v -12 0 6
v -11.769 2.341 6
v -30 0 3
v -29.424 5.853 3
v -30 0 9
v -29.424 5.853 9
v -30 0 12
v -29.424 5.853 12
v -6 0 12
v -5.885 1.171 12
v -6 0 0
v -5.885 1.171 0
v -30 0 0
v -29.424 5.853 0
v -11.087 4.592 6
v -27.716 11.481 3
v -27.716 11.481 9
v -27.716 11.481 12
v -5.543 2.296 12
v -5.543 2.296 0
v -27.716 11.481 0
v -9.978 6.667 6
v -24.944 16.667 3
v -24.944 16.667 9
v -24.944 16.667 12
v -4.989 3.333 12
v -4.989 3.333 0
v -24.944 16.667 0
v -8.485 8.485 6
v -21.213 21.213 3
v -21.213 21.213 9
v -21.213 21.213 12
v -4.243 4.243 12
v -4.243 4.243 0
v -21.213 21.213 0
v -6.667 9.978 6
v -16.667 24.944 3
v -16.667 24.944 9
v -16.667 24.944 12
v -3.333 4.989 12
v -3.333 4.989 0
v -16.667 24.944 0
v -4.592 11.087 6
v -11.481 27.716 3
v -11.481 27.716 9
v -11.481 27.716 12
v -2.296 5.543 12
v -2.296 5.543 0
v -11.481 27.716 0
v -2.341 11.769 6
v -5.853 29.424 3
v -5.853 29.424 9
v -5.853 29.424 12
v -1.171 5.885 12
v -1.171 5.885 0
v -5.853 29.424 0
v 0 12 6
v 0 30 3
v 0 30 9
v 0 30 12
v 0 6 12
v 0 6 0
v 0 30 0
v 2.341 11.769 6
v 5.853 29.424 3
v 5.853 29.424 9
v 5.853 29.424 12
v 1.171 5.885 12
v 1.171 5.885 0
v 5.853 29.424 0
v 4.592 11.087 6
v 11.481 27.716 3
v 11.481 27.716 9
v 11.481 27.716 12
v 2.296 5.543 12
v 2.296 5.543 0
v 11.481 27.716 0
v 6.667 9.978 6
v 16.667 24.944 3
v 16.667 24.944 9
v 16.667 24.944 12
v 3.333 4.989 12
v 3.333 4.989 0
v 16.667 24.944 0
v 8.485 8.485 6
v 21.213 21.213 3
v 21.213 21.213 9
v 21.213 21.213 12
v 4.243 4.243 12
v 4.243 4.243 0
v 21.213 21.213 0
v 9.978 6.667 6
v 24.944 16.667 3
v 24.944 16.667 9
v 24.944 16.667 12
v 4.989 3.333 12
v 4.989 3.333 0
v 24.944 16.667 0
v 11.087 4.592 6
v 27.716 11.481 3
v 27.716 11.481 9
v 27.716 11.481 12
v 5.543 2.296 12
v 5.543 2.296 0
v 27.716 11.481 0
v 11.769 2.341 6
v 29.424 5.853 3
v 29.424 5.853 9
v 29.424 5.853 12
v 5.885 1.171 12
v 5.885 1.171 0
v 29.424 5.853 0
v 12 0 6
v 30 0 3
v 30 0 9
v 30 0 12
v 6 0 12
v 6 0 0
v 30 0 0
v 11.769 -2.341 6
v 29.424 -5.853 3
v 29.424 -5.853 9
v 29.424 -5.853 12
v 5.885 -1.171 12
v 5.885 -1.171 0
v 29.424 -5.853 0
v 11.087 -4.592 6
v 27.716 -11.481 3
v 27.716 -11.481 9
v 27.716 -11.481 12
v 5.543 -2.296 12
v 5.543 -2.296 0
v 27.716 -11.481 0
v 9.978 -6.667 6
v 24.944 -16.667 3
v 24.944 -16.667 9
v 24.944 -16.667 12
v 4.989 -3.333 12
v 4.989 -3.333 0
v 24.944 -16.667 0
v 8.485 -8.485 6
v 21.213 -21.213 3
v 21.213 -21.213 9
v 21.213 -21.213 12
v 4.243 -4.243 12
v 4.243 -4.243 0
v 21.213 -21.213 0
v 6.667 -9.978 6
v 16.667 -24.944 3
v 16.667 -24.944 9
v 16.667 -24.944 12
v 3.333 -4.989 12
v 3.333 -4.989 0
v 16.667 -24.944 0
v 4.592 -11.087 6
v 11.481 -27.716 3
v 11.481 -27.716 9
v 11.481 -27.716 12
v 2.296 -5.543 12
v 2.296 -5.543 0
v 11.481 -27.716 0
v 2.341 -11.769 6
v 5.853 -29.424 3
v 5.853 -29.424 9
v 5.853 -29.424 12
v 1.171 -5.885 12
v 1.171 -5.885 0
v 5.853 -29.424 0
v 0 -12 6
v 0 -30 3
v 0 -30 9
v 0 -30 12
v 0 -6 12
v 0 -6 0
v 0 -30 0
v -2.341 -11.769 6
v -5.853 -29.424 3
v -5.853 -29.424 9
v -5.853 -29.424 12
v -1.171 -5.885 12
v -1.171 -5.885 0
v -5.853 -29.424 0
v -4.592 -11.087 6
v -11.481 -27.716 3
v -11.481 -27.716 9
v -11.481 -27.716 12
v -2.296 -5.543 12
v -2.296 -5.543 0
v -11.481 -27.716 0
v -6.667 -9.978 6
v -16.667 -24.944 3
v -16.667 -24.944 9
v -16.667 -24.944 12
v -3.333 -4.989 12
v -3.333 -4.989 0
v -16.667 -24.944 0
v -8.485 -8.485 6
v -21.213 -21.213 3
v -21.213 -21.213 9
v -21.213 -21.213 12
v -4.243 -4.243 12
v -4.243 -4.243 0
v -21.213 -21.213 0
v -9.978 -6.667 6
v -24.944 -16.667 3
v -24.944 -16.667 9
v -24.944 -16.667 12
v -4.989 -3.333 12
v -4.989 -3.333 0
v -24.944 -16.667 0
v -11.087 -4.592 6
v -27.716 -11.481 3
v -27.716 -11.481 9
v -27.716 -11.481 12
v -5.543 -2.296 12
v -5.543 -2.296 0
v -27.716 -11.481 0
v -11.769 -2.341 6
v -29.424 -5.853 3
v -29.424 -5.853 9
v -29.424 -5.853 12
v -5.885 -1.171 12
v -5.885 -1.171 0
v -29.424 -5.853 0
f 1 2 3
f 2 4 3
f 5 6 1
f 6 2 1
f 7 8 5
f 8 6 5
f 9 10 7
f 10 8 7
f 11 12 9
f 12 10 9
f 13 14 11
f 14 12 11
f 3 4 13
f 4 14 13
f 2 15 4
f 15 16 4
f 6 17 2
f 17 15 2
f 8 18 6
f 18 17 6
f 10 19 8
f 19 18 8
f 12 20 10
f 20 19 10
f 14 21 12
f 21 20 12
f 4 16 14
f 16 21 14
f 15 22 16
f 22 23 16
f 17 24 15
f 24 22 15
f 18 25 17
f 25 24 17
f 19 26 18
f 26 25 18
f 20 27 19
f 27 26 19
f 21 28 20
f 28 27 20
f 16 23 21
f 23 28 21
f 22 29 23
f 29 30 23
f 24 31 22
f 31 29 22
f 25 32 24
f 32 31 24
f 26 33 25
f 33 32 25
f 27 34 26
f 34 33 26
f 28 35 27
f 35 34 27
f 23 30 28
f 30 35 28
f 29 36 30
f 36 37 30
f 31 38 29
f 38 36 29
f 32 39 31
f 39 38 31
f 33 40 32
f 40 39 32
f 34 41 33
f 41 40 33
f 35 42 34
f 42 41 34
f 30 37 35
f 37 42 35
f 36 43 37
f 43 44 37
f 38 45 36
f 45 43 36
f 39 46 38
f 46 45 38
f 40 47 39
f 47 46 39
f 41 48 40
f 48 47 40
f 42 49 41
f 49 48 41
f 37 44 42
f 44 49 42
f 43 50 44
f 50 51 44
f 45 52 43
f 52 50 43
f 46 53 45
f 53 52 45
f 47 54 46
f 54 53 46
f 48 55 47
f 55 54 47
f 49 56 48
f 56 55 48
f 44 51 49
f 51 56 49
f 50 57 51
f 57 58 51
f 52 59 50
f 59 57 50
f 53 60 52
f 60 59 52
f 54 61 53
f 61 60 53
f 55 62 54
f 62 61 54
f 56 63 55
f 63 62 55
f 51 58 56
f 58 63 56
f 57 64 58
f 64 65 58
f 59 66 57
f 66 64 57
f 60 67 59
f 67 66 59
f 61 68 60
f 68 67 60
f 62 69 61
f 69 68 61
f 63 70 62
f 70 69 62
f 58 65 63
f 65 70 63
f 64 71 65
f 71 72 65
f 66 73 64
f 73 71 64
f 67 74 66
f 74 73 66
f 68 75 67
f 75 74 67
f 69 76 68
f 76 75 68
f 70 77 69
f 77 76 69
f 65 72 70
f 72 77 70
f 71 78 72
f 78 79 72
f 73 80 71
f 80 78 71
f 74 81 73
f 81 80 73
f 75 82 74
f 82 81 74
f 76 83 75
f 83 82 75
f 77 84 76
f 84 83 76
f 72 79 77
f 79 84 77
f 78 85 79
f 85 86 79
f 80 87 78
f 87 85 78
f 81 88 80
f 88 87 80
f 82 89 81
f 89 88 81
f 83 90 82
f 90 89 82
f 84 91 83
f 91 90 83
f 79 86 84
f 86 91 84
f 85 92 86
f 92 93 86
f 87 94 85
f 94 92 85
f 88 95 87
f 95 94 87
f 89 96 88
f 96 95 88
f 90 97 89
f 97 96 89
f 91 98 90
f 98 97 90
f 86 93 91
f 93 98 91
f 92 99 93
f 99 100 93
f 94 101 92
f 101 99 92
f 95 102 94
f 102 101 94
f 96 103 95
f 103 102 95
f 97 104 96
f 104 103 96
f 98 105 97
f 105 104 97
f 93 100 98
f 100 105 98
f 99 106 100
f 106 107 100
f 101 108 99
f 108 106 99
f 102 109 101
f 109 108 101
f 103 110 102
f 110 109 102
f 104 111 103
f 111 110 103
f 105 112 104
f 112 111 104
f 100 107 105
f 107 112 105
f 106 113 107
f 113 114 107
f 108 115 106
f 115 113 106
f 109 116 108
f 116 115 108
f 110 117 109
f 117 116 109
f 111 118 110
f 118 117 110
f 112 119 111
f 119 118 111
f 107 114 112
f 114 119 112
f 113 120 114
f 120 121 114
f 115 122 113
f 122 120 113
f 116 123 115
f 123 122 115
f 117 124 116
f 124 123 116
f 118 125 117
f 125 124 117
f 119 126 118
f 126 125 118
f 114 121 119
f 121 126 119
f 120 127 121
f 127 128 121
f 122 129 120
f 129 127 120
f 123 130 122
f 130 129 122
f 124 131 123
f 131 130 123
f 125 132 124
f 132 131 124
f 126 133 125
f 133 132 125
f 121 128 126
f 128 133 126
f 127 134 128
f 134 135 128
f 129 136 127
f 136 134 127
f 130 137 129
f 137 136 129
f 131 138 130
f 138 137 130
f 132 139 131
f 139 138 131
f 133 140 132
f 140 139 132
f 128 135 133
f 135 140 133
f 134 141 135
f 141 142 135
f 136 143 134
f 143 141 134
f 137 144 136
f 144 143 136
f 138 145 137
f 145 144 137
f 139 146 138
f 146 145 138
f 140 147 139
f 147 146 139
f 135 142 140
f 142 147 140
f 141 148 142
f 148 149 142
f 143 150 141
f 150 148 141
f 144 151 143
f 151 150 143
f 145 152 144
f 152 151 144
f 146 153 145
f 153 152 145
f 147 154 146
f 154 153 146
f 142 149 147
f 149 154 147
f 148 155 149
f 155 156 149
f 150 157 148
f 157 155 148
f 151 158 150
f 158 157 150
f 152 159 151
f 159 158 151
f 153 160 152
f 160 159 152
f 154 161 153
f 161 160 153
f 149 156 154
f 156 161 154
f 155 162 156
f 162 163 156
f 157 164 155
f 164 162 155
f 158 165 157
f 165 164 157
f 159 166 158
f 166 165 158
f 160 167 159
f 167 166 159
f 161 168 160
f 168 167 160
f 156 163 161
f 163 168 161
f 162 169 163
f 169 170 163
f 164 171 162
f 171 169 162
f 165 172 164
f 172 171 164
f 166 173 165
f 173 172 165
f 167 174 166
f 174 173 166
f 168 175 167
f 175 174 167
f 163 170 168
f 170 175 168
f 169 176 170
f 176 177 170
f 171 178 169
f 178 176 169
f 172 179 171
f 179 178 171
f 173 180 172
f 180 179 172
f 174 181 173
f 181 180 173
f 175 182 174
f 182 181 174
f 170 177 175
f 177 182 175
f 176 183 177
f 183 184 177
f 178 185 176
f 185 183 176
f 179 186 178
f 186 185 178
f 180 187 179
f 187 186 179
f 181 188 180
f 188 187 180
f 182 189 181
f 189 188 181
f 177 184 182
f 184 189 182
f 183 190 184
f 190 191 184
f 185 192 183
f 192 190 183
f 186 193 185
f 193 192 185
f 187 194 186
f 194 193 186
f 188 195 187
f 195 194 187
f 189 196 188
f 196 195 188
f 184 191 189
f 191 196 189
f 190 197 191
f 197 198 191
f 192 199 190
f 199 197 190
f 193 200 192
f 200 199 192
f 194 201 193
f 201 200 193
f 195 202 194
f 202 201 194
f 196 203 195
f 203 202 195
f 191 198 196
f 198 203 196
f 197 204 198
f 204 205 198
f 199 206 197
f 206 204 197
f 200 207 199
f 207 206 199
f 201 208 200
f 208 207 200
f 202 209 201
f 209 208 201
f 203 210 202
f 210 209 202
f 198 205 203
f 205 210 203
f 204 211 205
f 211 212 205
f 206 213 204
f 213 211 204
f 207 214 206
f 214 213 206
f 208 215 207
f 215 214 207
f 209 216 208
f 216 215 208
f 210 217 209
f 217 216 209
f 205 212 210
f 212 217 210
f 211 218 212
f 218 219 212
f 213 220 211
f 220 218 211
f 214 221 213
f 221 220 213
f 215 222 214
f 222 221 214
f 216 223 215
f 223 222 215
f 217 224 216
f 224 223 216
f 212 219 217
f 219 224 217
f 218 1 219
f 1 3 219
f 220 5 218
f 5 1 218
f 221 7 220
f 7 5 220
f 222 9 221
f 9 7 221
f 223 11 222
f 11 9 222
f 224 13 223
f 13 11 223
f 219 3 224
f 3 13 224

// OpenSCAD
$fn = 32;

// ----------------------------------------------------------------------
// Revolved part: V-groove pulley R30
// ----------------------------------------------------------------------

// --- parameters (mm) ---
bore_r = 6;               // bore radius
rim_r = 30;               // rim radius
rim_t = 12;               // rim width
groove_r = 12;            // groove root radius
groove_w = 3;             // groove half width
revolve_angle = 360;      // revolve sweep, degrees

bore_d = 2 * bore_r;
rim_d = 2 * rim_r;
groove_d = 2 * groove_r;

profile = [[6, 0], [30, 0], [30, 3], [12, 6], [30, 9], [30, 12], [6, 12]];  // primary outline, 7 points, counter clockwise

// --- the one profile operation ---
rotate_extrude(angle = revolve_angle) polygon(points = profile);
